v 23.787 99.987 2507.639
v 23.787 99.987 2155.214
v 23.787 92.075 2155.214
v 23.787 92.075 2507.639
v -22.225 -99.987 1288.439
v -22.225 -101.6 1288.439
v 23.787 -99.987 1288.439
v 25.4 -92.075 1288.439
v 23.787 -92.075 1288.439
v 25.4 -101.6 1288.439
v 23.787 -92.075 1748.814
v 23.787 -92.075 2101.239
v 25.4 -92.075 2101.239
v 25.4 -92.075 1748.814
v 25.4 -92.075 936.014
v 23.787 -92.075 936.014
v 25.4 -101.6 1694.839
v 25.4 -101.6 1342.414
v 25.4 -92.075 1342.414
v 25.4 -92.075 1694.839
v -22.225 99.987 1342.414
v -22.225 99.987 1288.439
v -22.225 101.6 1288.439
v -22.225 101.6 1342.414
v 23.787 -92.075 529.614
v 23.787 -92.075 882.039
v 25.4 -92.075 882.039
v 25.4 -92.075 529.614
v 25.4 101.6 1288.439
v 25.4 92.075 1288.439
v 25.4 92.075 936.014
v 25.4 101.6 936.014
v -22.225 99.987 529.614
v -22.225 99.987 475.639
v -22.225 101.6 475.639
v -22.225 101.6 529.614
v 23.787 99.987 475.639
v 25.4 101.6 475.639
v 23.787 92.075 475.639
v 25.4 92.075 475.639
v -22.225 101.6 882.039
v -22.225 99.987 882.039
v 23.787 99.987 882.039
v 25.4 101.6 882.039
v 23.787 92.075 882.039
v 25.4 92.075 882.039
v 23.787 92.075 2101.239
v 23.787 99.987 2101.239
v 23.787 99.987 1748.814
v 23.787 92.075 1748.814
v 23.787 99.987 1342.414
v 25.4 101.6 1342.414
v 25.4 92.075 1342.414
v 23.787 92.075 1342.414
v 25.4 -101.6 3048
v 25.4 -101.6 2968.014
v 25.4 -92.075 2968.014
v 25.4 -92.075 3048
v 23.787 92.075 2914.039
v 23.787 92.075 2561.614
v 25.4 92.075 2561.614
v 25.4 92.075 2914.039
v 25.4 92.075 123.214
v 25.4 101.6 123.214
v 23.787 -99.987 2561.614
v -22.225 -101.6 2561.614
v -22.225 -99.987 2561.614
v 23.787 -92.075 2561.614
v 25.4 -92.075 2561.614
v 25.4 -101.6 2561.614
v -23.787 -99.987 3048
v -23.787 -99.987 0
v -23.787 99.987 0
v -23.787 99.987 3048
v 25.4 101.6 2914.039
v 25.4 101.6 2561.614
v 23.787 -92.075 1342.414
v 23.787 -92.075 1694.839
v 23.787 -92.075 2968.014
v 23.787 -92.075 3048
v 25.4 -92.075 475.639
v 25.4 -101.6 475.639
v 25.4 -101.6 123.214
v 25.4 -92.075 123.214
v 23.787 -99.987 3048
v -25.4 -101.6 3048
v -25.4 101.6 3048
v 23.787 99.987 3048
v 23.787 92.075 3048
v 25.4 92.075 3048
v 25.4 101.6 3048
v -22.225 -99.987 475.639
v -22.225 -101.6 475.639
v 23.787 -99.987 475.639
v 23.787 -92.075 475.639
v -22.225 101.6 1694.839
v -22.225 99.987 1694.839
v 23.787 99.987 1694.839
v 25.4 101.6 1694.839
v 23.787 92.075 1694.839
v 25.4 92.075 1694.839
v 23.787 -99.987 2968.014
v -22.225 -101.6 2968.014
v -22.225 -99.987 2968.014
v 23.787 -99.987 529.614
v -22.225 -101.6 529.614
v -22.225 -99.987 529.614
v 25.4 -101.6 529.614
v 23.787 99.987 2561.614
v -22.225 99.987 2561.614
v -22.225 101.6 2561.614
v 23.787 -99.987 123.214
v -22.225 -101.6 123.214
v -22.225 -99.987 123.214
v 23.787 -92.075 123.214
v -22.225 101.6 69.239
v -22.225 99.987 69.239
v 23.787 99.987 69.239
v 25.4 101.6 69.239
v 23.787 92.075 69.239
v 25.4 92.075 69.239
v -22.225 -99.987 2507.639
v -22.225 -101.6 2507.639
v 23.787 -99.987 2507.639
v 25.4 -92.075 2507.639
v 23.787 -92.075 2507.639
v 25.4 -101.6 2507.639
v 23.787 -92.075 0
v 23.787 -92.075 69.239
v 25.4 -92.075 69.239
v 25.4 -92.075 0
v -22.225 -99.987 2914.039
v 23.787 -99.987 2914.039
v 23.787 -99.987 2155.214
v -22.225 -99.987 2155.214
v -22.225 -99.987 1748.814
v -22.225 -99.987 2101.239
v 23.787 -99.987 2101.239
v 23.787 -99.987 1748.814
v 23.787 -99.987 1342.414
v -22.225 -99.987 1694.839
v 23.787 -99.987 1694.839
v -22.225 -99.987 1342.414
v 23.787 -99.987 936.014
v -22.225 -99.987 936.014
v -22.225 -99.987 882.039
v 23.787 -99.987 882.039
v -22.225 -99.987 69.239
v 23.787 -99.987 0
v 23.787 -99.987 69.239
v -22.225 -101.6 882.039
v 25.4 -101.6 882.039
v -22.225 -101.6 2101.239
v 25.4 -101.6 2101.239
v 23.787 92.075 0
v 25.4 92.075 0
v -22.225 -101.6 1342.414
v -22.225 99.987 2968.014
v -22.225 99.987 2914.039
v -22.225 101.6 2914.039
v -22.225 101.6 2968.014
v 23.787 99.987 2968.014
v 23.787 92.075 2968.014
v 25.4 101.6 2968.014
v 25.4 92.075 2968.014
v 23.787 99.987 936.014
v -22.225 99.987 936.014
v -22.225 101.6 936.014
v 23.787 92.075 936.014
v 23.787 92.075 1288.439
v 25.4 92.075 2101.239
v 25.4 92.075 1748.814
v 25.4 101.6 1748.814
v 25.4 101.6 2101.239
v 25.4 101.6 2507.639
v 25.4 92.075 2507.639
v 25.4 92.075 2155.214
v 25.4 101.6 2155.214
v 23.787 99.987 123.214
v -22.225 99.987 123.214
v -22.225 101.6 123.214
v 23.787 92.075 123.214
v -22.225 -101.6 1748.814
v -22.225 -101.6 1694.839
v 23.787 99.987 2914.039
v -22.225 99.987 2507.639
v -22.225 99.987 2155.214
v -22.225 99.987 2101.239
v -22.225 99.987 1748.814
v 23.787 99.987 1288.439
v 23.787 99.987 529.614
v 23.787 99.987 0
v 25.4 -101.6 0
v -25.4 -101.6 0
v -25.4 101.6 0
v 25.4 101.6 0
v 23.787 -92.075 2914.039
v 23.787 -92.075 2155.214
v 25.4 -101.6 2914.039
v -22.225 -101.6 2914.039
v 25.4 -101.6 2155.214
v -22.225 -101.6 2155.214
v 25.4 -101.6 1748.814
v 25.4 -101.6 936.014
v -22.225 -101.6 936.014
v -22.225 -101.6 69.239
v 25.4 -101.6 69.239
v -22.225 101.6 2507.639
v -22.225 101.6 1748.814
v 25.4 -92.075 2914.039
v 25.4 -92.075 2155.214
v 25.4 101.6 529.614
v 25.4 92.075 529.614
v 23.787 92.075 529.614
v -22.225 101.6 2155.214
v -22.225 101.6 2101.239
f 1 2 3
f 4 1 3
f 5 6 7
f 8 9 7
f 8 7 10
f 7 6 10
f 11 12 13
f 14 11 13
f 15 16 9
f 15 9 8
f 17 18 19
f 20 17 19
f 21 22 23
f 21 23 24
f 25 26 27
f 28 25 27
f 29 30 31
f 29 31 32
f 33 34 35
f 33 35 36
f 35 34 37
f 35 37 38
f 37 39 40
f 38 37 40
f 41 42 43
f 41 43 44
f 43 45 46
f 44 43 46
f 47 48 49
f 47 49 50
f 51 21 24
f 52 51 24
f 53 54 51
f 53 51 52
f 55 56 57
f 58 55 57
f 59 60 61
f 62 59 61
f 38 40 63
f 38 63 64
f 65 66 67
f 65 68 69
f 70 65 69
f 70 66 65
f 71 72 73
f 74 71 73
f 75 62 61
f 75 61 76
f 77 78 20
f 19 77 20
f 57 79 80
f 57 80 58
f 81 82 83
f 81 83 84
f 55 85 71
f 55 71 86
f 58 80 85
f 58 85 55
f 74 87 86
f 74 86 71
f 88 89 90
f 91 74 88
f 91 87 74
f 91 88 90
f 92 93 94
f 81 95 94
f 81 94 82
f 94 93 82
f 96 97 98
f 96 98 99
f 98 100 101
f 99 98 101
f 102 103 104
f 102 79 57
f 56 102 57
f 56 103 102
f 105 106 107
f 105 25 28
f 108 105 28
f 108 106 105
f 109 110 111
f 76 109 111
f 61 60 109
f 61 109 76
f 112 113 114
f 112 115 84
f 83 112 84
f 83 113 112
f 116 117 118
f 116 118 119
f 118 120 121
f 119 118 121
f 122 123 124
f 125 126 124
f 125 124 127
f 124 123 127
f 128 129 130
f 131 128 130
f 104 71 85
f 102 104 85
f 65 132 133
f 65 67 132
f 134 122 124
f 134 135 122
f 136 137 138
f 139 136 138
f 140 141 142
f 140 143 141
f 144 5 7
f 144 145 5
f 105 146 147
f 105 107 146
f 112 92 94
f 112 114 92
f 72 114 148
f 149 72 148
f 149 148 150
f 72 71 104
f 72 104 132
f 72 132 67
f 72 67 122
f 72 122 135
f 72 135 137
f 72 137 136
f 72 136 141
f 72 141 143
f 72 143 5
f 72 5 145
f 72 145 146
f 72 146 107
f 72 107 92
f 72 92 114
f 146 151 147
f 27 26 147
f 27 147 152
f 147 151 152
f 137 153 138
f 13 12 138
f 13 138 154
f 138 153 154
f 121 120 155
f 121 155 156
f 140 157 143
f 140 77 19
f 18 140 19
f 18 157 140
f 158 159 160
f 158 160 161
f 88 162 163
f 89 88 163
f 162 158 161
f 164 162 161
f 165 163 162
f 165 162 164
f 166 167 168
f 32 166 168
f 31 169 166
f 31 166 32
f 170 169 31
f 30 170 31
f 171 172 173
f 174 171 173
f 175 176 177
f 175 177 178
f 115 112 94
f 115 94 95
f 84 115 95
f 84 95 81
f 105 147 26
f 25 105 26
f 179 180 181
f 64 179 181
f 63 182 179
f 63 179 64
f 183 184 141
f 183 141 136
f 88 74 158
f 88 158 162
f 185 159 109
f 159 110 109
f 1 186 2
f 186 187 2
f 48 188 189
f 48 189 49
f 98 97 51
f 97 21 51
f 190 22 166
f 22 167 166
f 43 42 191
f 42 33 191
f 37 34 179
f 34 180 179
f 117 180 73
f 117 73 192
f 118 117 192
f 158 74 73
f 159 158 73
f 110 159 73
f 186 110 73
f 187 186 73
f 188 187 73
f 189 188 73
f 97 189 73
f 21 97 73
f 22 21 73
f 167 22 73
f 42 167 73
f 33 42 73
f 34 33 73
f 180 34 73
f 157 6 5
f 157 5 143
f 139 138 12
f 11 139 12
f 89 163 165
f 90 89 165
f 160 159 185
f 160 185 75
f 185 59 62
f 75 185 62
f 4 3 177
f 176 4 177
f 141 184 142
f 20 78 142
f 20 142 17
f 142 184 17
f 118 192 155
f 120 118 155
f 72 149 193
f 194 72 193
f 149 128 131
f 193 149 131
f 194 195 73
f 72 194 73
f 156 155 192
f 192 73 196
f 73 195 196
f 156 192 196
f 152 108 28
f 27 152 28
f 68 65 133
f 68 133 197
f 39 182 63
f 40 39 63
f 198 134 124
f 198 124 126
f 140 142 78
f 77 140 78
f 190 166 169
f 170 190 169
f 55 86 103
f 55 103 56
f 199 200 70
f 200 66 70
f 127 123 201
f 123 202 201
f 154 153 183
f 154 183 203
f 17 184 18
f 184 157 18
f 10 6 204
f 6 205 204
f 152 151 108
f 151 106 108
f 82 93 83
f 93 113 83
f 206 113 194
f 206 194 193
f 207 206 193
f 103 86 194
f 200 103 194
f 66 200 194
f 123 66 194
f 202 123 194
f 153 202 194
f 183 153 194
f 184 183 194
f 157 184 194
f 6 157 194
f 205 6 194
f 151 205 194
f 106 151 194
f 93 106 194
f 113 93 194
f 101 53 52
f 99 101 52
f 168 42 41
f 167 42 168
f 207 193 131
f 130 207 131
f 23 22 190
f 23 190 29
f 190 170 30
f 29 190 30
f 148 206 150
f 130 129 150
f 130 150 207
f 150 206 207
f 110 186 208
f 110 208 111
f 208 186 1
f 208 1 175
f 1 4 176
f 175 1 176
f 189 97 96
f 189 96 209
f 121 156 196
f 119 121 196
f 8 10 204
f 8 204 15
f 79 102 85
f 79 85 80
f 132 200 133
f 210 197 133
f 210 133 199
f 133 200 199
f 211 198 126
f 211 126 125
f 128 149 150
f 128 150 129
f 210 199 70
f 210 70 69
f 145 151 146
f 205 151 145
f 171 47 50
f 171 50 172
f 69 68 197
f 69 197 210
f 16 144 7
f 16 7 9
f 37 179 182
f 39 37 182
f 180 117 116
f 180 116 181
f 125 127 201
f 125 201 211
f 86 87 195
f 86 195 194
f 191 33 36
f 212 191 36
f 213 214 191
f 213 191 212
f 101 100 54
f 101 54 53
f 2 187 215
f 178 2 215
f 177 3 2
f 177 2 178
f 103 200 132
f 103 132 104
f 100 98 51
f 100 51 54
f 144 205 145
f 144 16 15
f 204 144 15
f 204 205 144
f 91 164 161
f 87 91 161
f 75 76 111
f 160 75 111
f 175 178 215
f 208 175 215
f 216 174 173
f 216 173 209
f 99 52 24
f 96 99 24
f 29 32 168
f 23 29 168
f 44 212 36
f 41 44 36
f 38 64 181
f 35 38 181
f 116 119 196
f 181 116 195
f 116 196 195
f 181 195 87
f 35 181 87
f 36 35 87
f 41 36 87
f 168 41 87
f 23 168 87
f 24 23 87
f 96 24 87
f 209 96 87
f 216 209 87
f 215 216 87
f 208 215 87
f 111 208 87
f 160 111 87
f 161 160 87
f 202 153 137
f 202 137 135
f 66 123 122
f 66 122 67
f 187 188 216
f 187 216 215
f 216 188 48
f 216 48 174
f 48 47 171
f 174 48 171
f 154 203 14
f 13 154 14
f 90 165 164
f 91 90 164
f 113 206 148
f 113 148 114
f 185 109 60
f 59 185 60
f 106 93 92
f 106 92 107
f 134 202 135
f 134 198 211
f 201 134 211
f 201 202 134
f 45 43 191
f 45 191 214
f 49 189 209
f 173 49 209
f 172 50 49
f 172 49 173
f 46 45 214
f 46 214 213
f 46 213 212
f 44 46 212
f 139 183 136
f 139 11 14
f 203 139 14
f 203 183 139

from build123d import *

# Parameters (mm, degrees)
F0_W     = 1.6129
F0_H     = 7.9121
F0_H_2   = 1.6129
F0_W_2   = 47.5742
F0_H_3   = 199.9742
F1_DEPTH = 3048
F2_W     = 47.625
F2_H     = 53.975
F3_DEPTH = 203.201


with BuildPart() as f1:
    # F0 (on Top) → F1 (new body)
    with BuildSketch(Plane.XY):
        with Locations((24.59355, 96.03105)):
            Rectangle(F0_W, F0_H)
        with Locations((24.59355, 100.79355)):
            Rectangle(F0_W, F0_H_2)
        with Locations((0, 100.79355)):
            Rectangle(F0_W_2, F0_H_2)
        with Locations((-24.59355, 0)):
            Rectangle(F0_W, F0_H_3)
        with Locations((-24.59355, 100.79355)):
            Rectangle(F0_W, F0_H_2)
        with Locations((0, -100.79355)):
            Rectangle(F0_W_2, F0_H_2)
        with Locations((-24.59355, -100.79355)):
            Rectangle(F0_W, F0_H_2)
        with Locations((24.59355, -96.03105)):
            Rectangle(F0_W, F0_H)
        with Locations((24.59355, -100.79355)):
            Rectangle(F0_W, F0_H_2)
    extrude(amount=F1_DEPTH)

    # F2 (on face) → F3 (cut, through all)
    with BuildSketch(Plane.XZ.offset(101.6)):
        with Locations((1.5875, 2941.026397)):
            Rectangle(F2_W, F2_H)
        with Locations((1.5875, 2534.626397)):
            Rectangle(F2_W, F2_H)
        with Locations((1.5875, 2128.226397)):
            Rectangle(F2_W, F2_H)
        with Locations((1.5875, 1721.826397)):
            Rectangle(F2_W, F2_H)
        with Locations((1.5875, 1315.426397)):
            Rectangle(F2_W, F2_H)
        with Locations((1.5875, 909.026397)):
            Rectangle(F2_W, F2_H)
        with Locations((1.5875, 502.626397)):
            Rectangle(F2_W, F2_H)
        with Locations((1.5875, 96.226397)):
            Rectangle(F2_W, F2_H)
    extrude(amount=-F3_DEPTH, mode=Mode.SUBTRACT)


solid = f1.part
